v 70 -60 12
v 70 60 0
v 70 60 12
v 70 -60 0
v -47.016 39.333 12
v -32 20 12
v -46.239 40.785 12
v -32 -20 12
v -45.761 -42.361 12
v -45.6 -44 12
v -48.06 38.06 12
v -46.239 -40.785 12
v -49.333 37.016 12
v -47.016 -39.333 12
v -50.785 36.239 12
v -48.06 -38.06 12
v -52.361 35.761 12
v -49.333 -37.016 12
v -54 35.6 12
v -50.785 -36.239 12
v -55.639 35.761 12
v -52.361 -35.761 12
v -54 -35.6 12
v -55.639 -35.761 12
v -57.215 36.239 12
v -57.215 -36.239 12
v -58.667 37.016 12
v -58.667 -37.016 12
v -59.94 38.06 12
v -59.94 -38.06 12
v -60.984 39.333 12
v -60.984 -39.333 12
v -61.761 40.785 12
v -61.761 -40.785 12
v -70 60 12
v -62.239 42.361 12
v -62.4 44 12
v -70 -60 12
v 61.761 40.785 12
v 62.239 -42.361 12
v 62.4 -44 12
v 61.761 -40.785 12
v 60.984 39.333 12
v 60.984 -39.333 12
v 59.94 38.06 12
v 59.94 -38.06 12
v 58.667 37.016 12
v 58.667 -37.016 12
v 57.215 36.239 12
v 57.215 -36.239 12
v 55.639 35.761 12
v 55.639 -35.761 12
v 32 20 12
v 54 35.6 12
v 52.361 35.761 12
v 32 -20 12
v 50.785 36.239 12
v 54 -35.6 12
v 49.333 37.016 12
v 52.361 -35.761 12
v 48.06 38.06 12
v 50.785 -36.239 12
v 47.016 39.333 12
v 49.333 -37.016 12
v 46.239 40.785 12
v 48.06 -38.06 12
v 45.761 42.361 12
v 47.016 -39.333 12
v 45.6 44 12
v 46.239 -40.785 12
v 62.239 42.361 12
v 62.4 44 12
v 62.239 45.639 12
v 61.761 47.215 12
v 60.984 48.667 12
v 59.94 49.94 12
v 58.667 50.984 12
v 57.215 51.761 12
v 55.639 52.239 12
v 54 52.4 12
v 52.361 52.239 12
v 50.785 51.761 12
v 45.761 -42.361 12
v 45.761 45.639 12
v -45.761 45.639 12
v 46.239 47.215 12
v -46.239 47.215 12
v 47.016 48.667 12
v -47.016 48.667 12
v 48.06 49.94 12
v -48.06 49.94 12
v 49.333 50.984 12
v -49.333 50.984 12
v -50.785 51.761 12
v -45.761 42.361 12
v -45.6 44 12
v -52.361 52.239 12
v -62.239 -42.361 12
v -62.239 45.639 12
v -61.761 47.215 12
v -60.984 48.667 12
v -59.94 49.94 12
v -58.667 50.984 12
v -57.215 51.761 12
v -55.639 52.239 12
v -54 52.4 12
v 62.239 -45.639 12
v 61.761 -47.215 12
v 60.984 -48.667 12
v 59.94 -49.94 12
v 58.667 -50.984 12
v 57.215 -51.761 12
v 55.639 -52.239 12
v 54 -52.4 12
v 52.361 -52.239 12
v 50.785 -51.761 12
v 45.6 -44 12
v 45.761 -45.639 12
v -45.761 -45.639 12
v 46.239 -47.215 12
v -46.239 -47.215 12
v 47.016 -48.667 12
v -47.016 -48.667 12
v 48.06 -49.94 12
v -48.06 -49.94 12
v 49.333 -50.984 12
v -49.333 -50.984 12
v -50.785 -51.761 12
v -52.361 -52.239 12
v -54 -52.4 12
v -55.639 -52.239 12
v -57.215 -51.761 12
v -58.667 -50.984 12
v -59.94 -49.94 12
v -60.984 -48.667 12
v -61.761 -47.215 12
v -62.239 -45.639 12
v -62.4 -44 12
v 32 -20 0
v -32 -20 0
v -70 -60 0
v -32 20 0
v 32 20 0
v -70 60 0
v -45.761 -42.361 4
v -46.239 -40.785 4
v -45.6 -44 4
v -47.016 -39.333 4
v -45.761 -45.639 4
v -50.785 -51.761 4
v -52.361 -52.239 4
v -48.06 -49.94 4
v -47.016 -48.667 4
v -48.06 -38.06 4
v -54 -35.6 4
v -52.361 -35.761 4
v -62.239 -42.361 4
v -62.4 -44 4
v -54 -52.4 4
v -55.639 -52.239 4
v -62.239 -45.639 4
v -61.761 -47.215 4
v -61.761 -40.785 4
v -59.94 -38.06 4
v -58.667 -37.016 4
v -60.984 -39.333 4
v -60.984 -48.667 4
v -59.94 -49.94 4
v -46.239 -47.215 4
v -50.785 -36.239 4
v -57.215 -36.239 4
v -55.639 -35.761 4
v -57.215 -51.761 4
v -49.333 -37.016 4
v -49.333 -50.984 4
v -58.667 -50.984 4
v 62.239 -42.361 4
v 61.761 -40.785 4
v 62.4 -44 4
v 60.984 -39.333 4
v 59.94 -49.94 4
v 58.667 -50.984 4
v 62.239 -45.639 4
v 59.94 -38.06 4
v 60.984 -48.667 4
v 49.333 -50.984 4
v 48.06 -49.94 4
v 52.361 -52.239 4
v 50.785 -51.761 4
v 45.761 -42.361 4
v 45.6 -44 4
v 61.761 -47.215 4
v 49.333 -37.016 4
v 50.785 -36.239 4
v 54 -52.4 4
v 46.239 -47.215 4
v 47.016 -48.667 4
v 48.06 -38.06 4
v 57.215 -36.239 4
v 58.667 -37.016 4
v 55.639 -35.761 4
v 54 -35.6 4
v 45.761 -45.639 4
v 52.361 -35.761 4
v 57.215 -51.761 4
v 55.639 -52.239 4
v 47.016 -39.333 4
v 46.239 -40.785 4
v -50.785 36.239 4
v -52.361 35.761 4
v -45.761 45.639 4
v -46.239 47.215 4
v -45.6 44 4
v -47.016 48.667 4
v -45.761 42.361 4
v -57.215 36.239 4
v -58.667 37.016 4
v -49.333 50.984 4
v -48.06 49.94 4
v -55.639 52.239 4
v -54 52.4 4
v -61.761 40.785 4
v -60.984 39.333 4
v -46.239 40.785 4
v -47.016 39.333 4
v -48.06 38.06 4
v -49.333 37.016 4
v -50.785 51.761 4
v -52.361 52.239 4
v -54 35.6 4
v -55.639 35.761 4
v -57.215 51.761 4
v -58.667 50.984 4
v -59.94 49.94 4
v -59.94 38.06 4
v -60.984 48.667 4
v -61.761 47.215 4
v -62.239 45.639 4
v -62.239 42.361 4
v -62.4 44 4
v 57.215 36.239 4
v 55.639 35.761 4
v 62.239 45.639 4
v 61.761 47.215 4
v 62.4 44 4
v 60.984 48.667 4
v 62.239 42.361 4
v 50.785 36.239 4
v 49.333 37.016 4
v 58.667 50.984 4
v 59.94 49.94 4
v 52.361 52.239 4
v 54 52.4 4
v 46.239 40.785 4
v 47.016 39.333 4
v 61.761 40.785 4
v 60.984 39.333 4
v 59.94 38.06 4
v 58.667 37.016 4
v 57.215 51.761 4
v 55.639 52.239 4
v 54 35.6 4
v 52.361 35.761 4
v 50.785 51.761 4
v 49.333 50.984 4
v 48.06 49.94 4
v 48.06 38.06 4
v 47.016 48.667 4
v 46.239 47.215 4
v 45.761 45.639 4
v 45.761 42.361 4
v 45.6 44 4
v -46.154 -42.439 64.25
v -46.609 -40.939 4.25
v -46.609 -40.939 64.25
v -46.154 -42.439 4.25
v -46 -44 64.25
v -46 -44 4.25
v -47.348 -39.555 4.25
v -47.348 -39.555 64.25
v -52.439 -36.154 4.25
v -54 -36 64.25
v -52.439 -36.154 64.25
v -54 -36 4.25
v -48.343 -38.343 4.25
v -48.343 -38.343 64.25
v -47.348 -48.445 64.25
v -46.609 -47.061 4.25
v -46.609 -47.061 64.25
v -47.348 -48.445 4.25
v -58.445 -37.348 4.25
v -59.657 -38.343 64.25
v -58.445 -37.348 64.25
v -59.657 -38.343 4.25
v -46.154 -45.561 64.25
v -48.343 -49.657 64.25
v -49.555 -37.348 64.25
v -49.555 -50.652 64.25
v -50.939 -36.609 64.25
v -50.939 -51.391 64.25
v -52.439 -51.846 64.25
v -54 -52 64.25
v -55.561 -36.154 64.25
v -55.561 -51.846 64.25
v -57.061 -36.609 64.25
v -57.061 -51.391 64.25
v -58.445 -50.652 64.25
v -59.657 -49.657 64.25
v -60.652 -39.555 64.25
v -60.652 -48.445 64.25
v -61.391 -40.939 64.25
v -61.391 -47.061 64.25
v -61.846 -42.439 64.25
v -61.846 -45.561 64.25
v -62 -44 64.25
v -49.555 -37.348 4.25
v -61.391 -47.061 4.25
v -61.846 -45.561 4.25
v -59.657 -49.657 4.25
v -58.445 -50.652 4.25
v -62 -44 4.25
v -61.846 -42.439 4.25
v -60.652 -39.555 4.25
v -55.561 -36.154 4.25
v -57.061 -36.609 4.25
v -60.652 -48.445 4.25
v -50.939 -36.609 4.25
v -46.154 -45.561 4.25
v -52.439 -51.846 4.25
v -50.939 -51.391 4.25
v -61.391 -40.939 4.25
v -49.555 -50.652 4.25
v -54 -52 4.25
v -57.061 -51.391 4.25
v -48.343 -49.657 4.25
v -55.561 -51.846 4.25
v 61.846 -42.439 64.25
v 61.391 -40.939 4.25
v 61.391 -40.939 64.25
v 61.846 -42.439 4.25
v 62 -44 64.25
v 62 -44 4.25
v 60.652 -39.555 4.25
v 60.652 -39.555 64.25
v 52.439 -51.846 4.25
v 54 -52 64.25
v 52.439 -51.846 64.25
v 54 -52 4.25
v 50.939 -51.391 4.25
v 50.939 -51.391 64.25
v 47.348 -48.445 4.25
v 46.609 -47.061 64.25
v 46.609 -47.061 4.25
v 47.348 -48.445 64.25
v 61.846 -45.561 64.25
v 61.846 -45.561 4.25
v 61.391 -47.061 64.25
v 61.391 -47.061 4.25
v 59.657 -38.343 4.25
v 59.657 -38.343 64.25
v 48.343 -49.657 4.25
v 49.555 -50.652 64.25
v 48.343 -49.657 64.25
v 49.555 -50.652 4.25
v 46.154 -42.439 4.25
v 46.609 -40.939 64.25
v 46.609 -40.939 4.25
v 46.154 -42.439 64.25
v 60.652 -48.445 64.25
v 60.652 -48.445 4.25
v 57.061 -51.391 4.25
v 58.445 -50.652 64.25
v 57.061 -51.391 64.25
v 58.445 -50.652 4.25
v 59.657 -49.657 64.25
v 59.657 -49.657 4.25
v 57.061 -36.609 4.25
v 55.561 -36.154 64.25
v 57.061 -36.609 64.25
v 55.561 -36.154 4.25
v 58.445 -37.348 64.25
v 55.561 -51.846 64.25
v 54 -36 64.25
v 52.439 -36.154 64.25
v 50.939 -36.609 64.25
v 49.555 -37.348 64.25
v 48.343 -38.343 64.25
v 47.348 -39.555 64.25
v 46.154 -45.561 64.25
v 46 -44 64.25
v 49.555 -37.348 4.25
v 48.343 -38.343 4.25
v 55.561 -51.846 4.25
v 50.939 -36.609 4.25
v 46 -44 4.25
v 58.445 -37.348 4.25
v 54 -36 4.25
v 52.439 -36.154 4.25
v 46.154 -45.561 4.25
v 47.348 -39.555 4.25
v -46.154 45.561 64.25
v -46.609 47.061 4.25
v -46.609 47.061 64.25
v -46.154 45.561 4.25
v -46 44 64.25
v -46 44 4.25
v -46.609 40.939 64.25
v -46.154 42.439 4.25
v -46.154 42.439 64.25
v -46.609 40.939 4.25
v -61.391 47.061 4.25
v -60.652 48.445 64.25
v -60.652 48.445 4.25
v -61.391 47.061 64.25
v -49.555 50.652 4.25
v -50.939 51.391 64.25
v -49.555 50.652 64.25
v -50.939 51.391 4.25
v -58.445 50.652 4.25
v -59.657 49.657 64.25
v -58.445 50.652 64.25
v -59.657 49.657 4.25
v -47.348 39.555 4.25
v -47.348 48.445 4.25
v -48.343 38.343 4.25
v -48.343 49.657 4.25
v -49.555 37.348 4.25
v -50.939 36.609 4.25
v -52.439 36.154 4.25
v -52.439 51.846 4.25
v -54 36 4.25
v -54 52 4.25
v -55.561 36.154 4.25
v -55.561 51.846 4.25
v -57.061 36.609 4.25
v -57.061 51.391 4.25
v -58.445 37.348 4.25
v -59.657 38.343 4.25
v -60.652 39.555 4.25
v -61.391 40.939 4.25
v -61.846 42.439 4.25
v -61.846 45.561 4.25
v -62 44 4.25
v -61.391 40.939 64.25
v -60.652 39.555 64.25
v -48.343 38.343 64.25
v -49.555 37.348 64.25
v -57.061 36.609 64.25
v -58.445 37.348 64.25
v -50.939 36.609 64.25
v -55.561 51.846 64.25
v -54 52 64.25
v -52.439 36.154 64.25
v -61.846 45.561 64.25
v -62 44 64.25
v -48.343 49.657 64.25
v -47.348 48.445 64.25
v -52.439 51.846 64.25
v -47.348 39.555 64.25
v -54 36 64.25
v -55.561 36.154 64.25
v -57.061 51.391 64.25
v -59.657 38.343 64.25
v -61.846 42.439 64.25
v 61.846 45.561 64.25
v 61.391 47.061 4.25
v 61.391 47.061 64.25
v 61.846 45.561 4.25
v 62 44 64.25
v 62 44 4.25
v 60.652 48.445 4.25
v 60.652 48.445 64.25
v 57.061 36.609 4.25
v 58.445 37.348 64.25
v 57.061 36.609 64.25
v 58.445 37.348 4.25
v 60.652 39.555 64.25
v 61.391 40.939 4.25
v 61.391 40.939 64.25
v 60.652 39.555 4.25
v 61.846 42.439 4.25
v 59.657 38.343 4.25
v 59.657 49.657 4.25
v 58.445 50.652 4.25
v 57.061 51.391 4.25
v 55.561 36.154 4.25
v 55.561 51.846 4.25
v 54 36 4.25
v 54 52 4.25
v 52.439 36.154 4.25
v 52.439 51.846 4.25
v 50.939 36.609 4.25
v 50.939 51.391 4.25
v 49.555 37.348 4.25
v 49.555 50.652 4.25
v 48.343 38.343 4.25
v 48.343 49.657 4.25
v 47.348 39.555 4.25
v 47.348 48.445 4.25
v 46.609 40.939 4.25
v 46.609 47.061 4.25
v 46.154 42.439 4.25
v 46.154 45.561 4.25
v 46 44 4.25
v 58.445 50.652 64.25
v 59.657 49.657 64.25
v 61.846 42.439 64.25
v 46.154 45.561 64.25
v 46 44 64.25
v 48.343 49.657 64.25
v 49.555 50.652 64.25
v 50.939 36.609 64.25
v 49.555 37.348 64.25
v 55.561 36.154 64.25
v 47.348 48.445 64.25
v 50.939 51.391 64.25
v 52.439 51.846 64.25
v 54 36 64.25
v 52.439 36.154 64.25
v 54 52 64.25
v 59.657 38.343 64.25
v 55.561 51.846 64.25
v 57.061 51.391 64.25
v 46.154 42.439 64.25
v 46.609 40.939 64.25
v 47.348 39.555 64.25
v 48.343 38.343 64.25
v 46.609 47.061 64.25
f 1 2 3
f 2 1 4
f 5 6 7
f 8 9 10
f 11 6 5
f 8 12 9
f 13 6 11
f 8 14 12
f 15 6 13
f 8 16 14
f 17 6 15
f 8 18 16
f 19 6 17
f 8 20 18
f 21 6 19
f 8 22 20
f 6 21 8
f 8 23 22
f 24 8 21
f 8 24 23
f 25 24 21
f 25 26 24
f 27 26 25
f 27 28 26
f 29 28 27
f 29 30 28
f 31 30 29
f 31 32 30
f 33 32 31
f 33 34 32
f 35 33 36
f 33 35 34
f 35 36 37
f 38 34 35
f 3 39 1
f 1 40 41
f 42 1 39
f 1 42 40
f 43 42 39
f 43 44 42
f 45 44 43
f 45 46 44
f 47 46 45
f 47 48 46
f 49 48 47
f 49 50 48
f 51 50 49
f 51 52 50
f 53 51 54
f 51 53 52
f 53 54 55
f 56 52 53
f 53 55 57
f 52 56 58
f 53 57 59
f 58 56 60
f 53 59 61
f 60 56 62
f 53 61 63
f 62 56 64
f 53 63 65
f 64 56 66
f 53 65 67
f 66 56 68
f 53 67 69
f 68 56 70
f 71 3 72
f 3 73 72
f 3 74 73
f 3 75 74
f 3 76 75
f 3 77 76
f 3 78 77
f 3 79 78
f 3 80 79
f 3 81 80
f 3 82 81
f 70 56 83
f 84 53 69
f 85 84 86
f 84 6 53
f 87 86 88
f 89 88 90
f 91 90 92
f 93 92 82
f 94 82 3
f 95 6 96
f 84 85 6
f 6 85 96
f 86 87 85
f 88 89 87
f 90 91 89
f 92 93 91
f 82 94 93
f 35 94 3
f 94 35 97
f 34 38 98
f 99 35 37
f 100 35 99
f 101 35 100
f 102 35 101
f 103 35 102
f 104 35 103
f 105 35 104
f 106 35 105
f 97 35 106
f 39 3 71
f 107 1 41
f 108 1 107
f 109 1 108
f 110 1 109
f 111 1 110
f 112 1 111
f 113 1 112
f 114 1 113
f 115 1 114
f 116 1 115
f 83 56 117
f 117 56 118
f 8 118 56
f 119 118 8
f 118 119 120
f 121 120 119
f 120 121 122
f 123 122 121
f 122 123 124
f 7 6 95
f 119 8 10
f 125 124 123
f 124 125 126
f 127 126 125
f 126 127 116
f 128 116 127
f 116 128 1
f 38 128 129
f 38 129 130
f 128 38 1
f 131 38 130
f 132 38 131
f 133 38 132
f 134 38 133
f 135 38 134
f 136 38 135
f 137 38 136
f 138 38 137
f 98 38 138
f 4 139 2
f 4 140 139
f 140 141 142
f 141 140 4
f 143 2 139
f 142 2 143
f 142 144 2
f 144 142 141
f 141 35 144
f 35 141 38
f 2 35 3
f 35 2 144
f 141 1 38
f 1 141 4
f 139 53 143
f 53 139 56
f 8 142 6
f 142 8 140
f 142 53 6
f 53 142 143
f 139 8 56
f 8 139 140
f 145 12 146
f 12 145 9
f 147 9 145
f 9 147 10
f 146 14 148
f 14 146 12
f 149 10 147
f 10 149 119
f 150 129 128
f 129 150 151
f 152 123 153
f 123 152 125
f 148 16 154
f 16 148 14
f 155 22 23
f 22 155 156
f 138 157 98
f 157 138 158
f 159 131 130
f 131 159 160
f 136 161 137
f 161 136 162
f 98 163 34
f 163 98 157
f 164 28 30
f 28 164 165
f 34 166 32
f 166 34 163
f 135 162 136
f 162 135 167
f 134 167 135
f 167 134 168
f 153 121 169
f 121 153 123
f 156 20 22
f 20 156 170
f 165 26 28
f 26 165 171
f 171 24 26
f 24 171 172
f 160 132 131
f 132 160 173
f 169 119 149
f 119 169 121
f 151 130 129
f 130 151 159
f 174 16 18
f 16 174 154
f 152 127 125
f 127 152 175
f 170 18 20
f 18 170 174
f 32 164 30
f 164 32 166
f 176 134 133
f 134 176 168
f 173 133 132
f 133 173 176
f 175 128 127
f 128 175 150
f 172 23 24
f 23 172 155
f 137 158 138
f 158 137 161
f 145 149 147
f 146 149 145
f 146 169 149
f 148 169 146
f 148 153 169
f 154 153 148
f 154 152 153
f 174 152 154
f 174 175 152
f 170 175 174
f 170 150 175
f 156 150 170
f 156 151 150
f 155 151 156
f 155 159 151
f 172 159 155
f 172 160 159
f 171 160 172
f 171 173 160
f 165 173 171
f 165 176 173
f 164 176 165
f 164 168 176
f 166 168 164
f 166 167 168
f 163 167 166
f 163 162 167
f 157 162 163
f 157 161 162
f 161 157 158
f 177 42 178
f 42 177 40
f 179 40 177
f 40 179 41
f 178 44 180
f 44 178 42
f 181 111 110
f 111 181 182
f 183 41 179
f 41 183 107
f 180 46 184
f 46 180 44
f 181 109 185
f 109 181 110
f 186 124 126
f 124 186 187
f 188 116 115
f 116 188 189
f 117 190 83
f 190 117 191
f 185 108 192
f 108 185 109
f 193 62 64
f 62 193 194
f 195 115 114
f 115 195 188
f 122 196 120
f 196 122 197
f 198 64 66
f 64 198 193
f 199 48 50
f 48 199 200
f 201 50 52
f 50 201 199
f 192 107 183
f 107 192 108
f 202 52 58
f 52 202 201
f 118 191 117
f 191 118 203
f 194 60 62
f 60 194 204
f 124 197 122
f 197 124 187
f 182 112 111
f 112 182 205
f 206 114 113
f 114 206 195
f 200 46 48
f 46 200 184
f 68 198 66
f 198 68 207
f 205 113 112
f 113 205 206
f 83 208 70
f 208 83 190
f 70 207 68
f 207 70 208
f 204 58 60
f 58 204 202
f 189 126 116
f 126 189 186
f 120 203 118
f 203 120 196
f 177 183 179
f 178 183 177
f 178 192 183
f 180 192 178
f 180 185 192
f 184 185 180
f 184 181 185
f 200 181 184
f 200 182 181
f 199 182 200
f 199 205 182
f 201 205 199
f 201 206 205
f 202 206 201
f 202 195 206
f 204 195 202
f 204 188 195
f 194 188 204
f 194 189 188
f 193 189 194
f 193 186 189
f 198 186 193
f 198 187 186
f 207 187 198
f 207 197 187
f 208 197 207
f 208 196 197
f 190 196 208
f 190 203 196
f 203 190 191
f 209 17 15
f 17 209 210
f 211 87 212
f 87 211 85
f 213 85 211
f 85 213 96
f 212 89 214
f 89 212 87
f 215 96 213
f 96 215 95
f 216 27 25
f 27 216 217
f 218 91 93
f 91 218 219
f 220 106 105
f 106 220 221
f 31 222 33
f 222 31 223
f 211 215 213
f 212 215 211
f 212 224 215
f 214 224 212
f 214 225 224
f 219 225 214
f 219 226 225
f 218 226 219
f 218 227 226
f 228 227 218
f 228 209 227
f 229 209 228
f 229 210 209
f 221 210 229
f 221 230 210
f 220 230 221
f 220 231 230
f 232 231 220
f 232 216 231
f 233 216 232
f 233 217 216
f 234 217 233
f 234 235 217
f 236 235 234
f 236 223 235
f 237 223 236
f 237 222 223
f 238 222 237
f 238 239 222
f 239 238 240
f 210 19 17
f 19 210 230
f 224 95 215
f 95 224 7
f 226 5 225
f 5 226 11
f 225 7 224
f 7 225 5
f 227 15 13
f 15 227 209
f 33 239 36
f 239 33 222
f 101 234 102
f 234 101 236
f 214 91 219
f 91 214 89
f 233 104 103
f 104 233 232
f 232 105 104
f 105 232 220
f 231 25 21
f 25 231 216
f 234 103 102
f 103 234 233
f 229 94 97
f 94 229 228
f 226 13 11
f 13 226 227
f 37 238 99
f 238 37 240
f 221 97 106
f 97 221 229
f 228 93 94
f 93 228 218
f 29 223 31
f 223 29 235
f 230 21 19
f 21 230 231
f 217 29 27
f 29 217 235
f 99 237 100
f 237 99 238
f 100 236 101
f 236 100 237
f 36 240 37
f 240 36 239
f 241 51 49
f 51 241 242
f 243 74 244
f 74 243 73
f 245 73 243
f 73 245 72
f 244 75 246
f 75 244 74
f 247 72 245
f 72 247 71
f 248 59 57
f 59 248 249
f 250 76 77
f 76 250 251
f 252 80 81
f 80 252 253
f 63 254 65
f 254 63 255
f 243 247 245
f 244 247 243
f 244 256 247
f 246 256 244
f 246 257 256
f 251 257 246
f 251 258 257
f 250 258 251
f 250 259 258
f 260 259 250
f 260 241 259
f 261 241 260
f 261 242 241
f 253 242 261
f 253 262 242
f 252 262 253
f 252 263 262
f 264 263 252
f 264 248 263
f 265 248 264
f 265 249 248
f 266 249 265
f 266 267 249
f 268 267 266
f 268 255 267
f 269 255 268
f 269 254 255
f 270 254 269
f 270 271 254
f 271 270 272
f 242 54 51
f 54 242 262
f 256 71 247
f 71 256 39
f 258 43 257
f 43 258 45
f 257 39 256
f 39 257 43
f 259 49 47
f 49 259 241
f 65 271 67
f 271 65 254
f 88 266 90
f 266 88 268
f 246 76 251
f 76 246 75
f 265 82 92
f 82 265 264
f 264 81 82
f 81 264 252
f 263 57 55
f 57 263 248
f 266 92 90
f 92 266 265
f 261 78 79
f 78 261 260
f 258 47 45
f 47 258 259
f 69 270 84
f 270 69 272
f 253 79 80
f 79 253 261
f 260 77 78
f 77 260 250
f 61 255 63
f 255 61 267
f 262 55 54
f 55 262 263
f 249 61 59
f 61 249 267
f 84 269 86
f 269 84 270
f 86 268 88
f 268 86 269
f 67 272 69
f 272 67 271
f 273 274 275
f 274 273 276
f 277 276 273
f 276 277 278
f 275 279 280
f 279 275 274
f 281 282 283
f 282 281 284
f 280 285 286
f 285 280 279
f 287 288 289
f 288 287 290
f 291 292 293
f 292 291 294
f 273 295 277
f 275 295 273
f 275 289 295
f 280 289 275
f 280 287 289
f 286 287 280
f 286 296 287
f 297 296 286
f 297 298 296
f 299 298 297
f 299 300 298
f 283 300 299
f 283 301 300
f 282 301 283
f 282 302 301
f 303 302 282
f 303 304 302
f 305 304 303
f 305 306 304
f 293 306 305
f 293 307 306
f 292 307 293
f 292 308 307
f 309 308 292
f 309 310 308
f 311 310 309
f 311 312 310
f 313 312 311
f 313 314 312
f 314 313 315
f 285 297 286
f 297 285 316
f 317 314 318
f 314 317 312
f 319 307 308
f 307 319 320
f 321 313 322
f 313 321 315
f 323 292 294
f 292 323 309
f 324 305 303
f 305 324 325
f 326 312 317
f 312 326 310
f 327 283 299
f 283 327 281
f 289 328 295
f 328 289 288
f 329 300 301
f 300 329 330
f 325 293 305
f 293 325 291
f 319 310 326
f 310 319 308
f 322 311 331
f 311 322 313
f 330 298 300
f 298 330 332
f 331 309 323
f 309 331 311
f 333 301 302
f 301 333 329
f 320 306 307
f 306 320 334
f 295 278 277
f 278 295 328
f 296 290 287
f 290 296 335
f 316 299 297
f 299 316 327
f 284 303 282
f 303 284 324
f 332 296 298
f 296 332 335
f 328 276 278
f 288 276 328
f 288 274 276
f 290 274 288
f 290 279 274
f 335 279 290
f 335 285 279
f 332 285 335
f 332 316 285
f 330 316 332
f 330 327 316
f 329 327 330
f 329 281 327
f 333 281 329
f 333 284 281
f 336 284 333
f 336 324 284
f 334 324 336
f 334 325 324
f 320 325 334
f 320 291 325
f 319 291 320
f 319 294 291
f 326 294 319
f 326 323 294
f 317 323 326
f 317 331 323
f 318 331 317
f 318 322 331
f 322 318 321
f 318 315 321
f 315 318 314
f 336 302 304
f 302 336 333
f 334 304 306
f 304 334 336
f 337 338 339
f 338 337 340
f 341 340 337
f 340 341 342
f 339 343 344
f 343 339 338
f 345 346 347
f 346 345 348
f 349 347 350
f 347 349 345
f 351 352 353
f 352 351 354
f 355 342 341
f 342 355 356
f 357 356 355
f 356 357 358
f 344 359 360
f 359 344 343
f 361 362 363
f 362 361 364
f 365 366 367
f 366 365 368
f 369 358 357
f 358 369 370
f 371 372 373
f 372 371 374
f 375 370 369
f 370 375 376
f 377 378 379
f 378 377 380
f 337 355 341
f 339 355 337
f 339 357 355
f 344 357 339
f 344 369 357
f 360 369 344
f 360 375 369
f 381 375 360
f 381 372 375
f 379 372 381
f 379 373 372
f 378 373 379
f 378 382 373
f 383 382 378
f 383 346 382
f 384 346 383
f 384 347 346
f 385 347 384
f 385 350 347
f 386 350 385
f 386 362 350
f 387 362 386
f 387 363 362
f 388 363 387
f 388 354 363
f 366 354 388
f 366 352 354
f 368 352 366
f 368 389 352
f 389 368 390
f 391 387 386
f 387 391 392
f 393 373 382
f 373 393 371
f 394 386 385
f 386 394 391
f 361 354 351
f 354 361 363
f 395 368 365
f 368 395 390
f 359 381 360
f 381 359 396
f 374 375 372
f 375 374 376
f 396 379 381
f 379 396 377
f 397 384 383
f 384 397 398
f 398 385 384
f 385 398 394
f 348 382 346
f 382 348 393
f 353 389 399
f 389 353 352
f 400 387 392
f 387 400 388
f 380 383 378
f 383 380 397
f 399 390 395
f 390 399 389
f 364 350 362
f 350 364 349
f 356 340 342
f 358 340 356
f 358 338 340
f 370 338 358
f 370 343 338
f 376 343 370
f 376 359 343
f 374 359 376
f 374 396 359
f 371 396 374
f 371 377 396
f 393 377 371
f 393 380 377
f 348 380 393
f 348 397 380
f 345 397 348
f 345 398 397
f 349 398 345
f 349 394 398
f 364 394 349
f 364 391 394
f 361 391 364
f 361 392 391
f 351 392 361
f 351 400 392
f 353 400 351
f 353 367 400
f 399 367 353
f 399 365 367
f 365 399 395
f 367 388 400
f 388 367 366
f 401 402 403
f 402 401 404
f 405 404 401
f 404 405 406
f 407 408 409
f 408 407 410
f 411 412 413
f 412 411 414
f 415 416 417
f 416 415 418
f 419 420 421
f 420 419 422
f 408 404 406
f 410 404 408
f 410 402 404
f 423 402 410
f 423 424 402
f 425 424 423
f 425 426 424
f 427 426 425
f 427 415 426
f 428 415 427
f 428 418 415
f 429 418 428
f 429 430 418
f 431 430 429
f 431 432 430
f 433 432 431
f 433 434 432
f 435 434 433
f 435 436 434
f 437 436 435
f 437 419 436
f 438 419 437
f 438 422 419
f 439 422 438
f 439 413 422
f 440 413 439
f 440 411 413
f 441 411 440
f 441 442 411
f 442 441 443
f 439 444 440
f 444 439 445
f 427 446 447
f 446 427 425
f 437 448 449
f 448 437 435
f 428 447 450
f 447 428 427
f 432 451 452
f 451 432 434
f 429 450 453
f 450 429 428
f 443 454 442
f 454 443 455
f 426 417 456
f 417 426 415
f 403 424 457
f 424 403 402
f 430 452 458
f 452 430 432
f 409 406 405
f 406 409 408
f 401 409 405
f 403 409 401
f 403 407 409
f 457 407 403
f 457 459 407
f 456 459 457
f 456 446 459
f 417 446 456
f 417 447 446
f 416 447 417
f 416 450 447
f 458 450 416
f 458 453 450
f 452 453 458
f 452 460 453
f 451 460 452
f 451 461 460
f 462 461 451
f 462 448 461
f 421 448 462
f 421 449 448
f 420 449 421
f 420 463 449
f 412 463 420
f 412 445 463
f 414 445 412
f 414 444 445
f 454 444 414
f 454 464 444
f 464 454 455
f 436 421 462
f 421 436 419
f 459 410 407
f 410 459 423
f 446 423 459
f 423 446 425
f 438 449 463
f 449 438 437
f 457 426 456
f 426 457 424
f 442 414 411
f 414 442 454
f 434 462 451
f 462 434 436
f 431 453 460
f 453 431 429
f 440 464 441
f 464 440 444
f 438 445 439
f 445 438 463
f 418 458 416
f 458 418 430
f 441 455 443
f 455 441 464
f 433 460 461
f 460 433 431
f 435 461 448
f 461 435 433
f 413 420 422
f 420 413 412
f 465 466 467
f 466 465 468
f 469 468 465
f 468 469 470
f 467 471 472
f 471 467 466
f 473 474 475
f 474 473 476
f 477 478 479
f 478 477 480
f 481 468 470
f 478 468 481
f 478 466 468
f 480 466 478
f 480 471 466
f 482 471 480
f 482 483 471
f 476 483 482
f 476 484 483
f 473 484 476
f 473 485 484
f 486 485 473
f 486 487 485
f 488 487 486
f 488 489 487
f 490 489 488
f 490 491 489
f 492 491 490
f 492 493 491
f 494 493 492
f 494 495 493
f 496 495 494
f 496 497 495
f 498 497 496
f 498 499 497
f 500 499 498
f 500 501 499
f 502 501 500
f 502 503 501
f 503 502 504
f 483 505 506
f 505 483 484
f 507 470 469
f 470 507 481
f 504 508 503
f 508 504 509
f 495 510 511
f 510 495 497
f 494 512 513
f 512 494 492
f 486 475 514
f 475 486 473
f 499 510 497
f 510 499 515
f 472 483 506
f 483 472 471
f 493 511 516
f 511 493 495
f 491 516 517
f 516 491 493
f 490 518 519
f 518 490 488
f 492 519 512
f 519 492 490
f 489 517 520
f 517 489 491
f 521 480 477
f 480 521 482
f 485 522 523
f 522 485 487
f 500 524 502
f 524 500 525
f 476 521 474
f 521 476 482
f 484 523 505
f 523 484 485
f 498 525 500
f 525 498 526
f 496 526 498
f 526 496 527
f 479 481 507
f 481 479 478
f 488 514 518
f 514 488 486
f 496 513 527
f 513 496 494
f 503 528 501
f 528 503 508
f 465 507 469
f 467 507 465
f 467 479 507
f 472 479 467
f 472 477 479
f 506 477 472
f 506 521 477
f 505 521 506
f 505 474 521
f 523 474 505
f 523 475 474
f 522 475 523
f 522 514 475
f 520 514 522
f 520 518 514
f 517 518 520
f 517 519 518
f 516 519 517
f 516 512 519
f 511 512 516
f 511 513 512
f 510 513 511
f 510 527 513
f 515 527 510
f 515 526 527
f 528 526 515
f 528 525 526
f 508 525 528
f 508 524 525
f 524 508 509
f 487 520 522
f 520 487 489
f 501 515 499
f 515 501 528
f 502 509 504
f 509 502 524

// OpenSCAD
$fn = 32;

// ------------------------------------------------------------------------
// Frame with four posts: 140 x 120 mm frame, four d16 posts
// Every part is its own module, assembly() places them once.
// ------------------------------------------------------------------------

// --- part 1 ---
module base_frame() {
  difference() {
    translate([-70, -60, 0]) cube([140, 120, 12]);
    translate([-32, -20, -1]) cube([64, 40, 14]);
    translate([-54, -44, 4]) cylinder(h = 9, d = 16.8);
    translate([54, -44, 4]) cylinder(h = 9, d = 16.8);
    translate([-54, 44, 4]) cylinder(h = 9, d = 16.8);
    translate([54, 44, 4]) cylinder(h = 9, d = 16.8);
  }
}

// --- part 2 ---
module post1() {
  cylinder(h = 60, d = 16);
}

// --- part 3 ---
module post2() {
  cylinder(h = 60, d = 16);
}

// --- part 4 ---
module post3() {
  cylinder(h = 60, d = 16);
}

// --- part 5 ---
module post4() {
  cylinder(h = 60, d = 16);
}

// --- assembly ---
module assembly() {
  translate([0, 0, 0]) rotate([0, 0, 0]) base_frame();
  translate([-54, -44, 4.25]) rotate([0, 0, 0]) post1();
  translate([54, -44, 4.25]) rotate([0, 0, 0]) post2();
  translate([-54, 44, 4.25]) rotate([0, 0, 0]) post3();
  translate([54, 44, 4.25]) rotate([0, 0, 0]) post4();
}

assembly();
